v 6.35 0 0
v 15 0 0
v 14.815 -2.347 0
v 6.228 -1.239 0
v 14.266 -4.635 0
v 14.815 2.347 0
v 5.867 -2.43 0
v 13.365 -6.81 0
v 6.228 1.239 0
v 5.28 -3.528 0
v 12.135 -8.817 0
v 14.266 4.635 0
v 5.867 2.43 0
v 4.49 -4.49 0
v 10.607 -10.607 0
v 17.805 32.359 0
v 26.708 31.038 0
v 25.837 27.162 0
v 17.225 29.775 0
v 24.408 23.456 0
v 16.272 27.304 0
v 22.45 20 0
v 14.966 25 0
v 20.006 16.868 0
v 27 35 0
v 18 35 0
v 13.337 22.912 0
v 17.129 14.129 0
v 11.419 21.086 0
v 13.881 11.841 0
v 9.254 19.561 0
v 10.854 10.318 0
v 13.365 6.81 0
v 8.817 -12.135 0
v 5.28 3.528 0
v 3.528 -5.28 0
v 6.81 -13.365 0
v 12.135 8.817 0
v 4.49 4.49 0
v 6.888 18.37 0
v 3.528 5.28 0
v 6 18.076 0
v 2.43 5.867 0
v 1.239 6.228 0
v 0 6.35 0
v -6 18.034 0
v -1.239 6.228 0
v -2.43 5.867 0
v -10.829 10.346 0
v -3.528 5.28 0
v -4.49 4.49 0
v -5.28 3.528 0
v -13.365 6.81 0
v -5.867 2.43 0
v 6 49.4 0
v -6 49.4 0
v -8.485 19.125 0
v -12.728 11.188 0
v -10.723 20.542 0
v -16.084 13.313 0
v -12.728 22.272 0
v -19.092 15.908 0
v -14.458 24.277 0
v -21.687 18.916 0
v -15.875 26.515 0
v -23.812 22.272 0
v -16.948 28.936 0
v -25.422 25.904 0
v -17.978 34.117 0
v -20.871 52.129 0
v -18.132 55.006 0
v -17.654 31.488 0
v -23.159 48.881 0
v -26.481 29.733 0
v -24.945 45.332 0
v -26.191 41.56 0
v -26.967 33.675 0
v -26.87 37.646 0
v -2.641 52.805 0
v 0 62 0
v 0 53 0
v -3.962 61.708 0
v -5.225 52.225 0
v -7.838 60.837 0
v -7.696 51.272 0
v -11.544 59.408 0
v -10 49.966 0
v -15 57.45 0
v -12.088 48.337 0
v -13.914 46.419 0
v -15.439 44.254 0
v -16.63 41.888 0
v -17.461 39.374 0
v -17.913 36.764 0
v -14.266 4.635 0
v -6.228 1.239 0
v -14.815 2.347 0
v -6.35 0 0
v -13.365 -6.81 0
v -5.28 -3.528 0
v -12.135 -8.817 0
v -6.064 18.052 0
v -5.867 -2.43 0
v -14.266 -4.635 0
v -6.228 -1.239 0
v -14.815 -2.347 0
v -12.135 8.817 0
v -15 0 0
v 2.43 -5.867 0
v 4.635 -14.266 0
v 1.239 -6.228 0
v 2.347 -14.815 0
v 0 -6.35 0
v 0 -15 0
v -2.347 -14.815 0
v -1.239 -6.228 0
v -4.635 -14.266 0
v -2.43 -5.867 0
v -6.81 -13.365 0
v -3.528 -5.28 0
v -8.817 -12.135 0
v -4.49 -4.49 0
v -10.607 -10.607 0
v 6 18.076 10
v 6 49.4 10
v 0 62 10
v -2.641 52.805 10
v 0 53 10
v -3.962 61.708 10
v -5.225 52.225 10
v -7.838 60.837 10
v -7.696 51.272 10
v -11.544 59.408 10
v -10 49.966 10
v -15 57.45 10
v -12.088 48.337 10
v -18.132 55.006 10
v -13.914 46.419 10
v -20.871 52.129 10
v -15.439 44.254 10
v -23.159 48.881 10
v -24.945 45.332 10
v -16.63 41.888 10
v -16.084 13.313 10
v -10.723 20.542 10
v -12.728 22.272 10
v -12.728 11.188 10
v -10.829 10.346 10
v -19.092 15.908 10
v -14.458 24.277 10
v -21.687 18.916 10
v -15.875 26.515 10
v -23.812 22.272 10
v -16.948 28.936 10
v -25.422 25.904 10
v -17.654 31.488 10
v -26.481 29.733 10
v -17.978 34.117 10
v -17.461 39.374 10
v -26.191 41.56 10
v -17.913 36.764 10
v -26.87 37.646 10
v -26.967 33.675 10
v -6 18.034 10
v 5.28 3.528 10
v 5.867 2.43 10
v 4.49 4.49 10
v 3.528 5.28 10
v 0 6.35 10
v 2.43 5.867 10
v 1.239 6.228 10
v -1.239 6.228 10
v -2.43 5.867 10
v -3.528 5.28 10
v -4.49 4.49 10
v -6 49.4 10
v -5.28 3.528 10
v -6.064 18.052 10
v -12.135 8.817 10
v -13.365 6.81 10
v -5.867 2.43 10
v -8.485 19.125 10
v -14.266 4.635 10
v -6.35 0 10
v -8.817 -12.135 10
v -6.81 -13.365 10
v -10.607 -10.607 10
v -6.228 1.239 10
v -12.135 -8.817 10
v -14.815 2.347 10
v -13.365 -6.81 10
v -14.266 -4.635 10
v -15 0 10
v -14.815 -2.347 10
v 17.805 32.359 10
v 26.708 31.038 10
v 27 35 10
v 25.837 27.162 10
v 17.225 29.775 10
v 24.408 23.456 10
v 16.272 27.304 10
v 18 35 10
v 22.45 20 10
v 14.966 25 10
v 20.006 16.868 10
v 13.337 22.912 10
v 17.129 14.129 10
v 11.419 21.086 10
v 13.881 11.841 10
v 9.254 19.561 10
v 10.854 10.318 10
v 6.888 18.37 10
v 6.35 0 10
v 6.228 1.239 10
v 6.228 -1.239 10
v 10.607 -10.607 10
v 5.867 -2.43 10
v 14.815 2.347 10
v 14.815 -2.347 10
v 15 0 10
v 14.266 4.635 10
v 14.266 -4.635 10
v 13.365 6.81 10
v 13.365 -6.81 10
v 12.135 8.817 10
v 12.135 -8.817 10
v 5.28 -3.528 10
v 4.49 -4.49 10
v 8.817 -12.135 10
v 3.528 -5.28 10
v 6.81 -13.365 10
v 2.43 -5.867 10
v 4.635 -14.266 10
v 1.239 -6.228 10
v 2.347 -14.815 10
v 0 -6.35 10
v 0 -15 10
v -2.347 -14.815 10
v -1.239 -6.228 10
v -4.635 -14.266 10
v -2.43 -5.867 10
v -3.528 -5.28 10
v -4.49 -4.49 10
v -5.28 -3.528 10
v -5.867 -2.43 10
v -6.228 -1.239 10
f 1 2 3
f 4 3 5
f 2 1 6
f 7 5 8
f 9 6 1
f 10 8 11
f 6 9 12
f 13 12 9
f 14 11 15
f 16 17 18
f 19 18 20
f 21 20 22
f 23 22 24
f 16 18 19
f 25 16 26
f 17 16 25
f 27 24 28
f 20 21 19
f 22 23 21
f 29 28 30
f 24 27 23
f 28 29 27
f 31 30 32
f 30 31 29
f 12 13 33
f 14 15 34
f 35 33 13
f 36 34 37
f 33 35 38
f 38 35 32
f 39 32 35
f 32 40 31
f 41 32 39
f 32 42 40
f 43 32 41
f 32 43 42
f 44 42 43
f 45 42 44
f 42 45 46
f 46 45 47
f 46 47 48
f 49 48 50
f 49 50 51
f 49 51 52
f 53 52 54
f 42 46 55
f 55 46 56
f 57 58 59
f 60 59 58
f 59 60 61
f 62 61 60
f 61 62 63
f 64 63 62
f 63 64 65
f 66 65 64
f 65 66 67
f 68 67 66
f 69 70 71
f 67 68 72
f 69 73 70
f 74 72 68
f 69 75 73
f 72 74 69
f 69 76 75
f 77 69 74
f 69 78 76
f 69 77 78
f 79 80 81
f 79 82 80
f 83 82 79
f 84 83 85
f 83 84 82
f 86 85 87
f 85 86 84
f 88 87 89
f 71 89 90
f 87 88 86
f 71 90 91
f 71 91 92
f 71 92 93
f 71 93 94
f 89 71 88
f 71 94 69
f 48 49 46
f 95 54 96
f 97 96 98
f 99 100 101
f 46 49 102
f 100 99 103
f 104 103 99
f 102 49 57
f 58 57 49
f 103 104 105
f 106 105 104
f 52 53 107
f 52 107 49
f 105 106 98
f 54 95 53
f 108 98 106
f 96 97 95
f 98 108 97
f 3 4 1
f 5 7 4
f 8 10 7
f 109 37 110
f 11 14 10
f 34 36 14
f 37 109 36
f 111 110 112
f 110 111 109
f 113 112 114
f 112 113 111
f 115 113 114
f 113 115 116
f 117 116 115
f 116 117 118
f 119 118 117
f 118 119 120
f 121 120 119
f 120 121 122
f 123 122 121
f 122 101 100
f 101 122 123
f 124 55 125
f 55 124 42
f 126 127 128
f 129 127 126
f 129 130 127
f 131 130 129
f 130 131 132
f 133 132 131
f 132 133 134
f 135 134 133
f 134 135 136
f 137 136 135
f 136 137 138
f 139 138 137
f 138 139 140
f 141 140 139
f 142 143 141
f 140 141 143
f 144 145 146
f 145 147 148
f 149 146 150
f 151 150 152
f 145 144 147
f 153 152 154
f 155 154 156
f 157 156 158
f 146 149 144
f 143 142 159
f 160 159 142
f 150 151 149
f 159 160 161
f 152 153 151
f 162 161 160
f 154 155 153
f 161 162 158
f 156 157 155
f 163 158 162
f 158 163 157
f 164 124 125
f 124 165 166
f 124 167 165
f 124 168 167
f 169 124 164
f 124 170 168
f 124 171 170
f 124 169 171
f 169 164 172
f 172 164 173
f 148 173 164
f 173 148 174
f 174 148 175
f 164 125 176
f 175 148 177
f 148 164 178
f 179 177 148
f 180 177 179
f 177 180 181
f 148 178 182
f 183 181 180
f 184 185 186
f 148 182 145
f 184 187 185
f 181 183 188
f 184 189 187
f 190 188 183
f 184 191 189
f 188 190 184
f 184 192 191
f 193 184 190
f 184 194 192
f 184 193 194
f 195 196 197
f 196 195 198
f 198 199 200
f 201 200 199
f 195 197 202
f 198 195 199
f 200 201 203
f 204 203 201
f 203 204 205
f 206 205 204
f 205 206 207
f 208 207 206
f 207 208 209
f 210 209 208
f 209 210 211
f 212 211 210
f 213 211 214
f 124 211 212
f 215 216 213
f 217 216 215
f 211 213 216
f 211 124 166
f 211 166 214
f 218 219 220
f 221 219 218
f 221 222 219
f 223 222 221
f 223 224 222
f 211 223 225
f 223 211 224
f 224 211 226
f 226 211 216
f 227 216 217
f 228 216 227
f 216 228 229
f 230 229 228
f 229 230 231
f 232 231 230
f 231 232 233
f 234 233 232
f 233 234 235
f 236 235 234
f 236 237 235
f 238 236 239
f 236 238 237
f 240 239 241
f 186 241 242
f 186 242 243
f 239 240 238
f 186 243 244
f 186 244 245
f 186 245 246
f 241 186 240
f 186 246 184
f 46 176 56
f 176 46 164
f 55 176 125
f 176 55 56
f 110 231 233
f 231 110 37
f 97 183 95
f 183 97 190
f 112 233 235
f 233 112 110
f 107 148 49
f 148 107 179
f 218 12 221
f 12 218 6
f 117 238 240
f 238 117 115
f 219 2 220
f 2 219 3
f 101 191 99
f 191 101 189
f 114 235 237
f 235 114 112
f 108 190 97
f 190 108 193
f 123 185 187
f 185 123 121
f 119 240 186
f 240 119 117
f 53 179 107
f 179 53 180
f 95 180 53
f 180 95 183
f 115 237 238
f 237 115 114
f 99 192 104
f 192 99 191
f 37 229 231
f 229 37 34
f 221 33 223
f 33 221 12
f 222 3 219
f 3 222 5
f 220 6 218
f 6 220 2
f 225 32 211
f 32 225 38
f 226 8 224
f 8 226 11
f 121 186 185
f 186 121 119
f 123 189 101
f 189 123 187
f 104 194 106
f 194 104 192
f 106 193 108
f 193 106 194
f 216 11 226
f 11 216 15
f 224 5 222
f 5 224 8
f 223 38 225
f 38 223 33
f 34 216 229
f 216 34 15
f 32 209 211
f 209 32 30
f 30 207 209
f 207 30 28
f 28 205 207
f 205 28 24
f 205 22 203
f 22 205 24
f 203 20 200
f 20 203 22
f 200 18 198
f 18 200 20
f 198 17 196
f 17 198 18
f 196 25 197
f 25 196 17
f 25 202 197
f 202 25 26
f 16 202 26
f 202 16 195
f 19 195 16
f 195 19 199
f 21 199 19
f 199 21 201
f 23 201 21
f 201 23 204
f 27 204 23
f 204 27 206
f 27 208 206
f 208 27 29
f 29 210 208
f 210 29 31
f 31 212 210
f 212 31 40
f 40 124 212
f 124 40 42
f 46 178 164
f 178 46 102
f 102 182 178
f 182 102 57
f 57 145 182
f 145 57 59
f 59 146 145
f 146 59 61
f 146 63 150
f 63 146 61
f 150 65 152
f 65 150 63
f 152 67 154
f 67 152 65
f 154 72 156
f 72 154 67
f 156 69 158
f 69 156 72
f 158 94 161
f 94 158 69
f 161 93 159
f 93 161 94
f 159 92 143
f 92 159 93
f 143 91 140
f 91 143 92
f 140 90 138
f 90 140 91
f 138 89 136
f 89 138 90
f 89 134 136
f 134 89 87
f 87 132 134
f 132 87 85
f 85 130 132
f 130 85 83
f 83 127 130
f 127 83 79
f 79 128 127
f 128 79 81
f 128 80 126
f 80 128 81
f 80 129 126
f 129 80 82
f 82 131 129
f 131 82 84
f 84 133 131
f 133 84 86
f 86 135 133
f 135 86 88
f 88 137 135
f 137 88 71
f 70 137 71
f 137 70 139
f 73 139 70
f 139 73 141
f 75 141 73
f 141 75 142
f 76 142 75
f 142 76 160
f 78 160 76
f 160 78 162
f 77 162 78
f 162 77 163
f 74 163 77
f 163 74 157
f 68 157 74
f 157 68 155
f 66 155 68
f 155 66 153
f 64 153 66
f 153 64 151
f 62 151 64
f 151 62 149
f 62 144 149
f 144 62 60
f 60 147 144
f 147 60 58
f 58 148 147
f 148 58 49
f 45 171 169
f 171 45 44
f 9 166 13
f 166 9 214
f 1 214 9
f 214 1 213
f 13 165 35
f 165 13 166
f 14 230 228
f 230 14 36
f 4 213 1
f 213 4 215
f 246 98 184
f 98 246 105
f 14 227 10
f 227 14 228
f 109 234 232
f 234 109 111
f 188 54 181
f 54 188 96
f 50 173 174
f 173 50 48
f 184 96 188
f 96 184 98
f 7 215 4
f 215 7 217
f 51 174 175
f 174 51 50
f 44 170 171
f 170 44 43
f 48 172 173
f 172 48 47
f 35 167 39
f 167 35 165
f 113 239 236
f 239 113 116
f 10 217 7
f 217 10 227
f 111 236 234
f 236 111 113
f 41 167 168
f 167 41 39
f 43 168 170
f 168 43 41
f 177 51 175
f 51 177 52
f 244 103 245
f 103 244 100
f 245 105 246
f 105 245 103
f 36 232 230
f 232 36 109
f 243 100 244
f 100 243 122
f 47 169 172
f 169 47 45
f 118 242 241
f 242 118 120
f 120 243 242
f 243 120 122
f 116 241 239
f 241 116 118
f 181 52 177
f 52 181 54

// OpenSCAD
$fn = 32;

// ----------------------------------------------------------------------
// Hook: 70 mm shank into a 18 mm curl, 10 mm thick
// ----------------------------------------------------------------------

// --- parameters (mm) ---
shank_len = 70;           // shank length from the boss centre
shank_w = 12;             // shank width
boss_d = 30;              // boss diameter
bore_d = 12.7;            // boss bore
curl_in = 18;             // curl inner radius
curl_out = 27;            // curl outer radius
curl_sweep = 270;         // curl sweep angle
hook_t = 10;              // hook thickness

shank_profile = [[-6, 49.4], [6, 49.4], [6, 13], [-6, 13]];
boss_profile = [[15, 0], [14.815, 2.347], [14.266, 4.635], [13.365, 6.81], [12.135, 8.817], [10.607, 10.607], [8.817, 12.135], [6.81, 13.365], [4.635, 14.266], [2.347, 14.815], [0, 15], [-2.347, 14.815], [-4.635, 14.266], [-6.81, 13.365], [-8.817, 12.135], [-10.607, 10.607], [-12.135, 8.817], [-13.365, 6.81], [-14.266, 4.635], [-14.815, 2.347], [-15, 0], [-14.815, -2.347], [-14.266, -4.635], [-13.365, -6.81], [-12.135, -8.817], [-10.607, -10.607], [-8.817, -12.135], [-6.81, -13.365], [-4.635, -14.266], [-2.347, -14.815], [0, -15], [2.347, -14.815], [4.635, -14.266], [6.81, -13.365], [8.817, -12.135], [10.607, -10.607], [12.135, -8.817], [13.365, -6.81], [14.266, -4.635], [14.815, -2.347]];
curl_profile = [[0, 62], [-3.962, 61.708], [-7.838, 60.837], [-11.544, 59.408], [-15, 57.45], [-18.132, 55.006], [-20.871, 52.129], [-23.159, 48.881], [-24.945, 45.332], [-26.191, 41.56], [-26.87, 37.646], [-26.967, 33.675], [-26.481, 29.733], [-25.422, 25.904], [-23.812, 22.272], [-21.687, 18.916], [-19.092, 15.908], [-16.084, 13.313], [-12.728, 11.188], [-9.096, 9.578], [-5.267, 8.519], [-1.325, 8.033], [2.646, 8.13], [6.56, 8.809], [10.332, 10.055], [13.881, 11.841], [17.129, 14.129], [20.006, 16.868], [22.45, 20], [24.408, 23.456], [25.837, 27.162], [26.708, 31.038], [27, 35], [18, 35], [17.805, 32.359], [17.225, 29.775], [16.272, 27.304], [14.966, 25], [13.337, 22.912], [11.419, 21.086], [9.254, 19.561], [6.888, 18.37], [4.374, 17.539], [1.764, 17.087], [-0.883, 17.022], [-3.512, 17.346], [-6.064, 18.052], [-8.485, 19.125], [-10.723, 20.542], [-12.728, 22.272], [-14.458, 24.277], [-15.875, 26.515], [-16.948, 28.936], [-17.654, 31.488], [-17.978, 34.117], [-17.913, 36.764], [-17.461, 39.374], [-16.63, 41.888], [-15.439, 44.254], [-13.914, 46.419], [-12.088, 48.337], [-10, 49.966], [-7.696, 51.272], [-5.225, 52.225], [-2.641, 52.805], [0, 53]];

difference() {
  union() {
    /* three overlapping outlines: shank, boss and the smooth curl */
    linear_extrude(height = hook_t) polygon(shank_profile);
    linear_extrude(height = hook_t) polygon(boss_profile);
    linear_extrude(height = hook_t) polygon(curl_profile);
  }
  translate([0, 0, -2.5]) cylinder(h = hook_t + 5, d = bore_d);
}
